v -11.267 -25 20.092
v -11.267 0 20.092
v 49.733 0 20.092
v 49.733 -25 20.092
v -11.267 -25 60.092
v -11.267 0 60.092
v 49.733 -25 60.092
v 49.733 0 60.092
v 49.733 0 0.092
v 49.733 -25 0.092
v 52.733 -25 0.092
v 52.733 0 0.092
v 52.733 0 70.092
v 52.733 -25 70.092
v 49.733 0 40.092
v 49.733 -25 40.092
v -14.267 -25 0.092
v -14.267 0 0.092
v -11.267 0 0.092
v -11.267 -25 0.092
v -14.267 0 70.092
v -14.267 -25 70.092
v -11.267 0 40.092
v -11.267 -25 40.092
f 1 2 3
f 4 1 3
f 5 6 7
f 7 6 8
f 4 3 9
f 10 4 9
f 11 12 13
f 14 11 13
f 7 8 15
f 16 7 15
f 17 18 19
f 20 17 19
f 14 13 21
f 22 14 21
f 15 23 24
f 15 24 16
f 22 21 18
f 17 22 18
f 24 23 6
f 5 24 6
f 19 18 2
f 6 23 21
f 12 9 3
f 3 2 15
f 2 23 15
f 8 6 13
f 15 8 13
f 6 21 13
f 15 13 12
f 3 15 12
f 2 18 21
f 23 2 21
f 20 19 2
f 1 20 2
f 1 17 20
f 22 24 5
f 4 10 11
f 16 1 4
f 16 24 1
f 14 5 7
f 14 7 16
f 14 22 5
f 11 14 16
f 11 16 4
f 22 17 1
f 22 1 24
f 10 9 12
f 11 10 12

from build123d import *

# Parameters (mm, degrees)
F0_W     = 61
F0_H     = 20
F1_DEPTH = 25


with BuildPart() as f1:
    # F0 (on Front) → F1 (new body)
    with BuildSketch(Plane.XZ):
        Polygon((-14.266822, 0.092322), (-11.266822, 0.092322), (-11.266822, 20.092322), (-11.266822, 40.092322), (-11.266822, 60.092322), (49.733178, 60.092322), (49.733178, 40.092322), (49.733178, 20.092322), (49.733178, 0.092322), (52.733178, 0.092322), (52.733178, 70.092322), (49.733178, 70.092322), (-14.266822, 70.092322), align=None)
        with Locations((19.233178, 30.092322)):
            Rectangle(F0_W, F0_H)
    extrude(amount=F1_DEPTH)


solid = f1.part
